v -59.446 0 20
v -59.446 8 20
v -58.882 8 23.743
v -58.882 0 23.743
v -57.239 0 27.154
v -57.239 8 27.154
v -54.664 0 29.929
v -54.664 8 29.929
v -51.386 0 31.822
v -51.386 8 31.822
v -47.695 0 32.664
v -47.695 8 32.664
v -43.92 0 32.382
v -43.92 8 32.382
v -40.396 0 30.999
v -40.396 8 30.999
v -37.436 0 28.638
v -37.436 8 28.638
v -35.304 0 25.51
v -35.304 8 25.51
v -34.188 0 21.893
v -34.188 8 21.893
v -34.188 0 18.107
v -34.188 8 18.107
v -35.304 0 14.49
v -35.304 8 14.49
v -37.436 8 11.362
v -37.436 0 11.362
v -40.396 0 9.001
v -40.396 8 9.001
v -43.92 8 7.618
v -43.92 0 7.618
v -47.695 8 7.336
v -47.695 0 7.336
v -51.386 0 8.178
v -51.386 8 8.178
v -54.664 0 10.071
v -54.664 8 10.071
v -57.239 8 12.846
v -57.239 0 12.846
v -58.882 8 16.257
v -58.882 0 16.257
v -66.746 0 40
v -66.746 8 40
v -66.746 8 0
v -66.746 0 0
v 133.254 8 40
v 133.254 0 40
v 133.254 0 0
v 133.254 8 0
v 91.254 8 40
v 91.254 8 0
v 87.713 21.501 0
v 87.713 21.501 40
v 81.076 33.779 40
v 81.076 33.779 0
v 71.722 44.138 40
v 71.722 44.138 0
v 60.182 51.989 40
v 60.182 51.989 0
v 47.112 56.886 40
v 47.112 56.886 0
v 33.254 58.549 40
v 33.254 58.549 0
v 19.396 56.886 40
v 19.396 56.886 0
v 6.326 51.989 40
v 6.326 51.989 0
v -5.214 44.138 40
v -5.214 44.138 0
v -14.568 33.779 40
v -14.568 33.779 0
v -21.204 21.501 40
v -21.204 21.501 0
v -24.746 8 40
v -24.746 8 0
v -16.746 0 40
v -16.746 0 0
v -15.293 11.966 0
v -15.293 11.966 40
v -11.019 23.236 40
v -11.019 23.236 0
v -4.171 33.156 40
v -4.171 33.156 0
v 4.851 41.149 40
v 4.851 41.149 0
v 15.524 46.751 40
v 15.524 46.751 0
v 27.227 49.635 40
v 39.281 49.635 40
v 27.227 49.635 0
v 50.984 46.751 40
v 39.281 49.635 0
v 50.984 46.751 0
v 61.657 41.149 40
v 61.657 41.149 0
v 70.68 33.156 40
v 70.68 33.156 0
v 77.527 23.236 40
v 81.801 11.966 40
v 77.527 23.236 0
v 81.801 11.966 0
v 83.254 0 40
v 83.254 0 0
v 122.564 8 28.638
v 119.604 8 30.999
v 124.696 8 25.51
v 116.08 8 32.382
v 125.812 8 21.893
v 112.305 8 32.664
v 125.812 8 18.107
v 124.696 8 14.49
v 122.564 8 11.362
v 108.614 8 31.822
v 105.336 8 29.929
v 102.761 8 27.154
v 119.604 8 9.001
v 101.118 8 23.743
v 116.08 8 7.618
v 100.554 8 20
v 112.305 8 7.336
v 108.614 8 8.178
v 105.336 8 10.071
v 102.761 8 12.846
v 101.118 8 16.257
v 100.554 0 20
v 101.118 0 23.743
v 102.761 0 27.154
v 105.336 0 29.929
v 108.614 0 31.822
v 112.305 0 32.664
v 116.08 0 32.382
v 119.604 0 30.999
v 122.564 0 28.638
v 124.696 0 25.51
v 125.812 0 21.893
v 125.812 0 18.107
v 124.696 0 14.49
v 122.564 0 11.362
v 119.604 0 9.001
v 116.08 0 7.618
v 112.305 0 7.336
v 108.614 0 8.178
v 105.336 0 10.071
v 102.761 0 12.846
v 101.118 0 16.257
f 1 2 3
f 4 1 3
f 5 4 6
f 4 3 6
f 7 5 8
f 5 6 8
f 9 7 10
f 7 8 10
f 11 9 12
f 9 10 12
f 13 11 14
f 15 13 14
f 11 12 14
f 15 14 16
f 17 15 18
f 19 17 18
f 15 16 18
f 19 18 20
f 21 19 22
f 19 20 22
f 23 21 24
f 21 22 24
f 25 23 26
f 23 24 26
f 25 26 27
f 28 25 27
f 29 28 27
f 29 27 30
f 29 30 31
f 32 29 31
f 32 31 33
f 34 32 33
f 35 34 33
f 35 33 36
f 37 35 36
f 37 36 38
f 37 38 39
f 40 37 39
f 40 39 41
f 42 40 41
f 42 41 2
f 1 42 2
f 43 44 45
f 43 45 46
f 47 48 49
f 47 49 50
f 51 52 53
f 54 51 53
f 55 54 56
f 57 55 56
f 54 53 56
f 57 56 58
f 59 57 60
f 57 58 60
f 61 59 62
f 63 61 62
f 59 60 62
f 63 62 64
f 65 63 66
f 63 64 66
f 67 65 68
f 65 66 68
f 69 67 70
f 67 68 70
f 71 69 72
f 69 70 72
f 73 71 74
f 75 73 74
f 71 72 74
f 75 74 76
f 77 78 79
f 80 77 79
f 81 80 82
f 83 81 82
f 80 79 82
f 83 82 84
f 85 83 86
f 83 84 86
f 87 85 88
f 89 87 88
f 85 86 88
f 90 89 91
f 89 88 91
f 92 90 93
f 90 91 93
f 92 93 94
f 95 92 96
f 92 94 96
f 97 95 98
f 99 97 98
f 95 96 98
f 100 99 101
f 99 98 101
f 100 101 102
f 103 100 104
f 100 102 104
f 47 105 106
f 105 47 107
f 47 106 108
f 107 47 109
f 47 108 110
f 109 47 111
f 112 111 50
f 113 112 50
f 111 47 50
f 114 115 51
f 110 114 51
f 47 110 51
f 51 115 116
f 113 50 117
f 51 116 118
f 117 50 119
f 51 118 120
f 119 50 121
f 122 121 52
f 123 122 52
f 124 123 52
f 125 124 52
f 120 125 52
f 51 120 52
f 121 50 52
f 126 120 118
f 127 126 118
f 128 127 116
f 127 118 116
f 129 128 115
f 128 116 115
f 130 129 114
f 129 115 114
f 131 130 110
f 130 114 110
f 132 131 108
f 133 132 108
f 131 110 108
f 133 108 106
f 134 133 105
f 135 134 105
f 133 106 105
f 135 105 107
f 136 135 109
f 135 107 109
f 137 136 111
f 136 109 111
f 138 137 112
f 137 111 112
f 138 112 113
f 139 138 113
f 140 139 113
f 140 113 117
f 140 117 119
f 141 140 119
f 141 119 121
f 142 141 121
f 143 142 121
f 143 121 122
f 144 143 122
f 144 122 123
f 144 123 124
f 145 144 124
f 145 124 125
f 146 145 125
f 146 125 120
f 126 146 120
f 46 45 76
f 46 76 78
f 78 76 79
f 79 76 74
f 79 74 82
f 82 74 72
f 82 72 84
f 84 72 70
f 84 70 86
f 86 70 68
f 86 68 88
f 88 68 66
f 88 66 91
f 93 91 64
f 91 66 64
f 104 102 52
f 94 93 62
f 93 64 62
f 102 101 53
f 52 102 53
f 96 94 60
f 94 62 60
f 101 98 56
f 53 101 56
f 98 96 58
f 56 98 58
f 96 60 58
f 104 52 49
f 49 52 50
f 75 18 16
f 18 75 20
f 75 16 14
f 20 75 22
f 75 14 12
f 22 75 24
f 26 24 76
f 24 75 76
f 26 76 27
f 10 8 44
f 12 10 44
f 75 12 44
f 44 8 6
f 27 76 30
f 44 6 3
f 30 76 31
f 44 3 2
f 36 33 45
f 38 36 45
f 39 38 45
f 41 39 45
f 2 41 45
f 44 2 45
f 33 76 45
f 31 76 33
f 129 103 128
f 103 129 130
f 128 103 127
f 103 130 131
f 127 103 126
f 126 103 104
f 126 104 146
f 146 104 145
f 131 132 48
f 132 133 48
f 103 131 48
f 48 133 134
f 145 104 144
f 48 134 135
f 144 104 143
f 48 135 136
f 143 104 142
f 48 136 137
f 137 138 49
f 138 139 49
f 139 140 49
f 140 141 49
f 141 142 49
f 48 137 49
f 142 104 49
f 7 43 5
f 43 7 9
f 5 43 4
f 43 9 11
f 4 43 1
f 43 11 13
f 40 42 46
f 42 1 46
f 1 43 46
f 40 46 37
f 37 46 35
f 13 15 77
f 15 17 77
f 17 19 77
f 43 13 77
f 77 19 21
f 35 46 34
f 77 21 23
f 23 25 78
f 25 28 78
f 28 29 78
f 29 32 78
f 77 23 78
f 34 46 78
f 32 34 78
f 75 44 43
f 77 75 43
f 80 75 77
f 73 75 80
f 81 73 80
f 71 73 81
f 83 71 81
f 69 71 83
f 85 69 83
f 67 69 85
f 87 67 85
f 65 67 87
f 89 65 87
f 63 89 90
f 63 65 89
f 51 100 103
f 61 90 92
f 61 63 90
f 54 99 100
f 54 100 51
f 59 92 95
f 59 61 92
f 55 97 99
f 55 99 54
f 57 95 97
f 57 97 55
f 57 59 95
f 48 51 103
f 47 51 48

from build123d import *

# Parameters (mm, degrees)
BOSS_EXTRUDE1_DEPTH = 40
SKETCH2_R           = 12.7
CUT_EXTRUDE2_DEPTH  = 40


with BuildPart() as part:
    # Sketch1 → Boss-Extrude1 (new body)
    with BuildSketch(Plane.XY):
        with BuildLine():
            Line((133.254134777, 0), (133.254134777, 8))
            Line((133.254134777, 8), (91.254134777, 8))
            ThreePointArc((91.254134777, 8), (33.254134777, 58.549124673), (-24.745865223, 8))
            Line((-24.745865223, 8), (-66.745865223, 8))
            Line((-66.745865223, 8), (-66.745865223, 0))
            Line((-66.745865223, 0), (-16.745865223, 0))
            ThreePointArc((-16.745865223, 0), (33.254134777, 50), (83.254134777, 0))
            Line((83.254134777, 0), (133.254134777, 0))
        make_face()
    extrude(amount=BOSS_EXTRUDE1_DEPTH)

    # Sketch2 → Cut-Extrude2 (cut)
    with BuildSketch(Plane(origin=(0, 8, 0), x_dir=(1, 0, 0), z_dir=(0, 1, 0))):
        with Locations(Location((-46.745865223, -20, 0), (0, 0, 180))):
            Circle(SKETCH2_R)
        with Locations(Location((113.254134777, -20, 0), (0, 0, 180))):
            Circle(SKETCH2_R)
    extrude(amount=-CUT_EXTRUDE2_DEPTH, mode=Mode.SUBTRACT)


solid = part.part
